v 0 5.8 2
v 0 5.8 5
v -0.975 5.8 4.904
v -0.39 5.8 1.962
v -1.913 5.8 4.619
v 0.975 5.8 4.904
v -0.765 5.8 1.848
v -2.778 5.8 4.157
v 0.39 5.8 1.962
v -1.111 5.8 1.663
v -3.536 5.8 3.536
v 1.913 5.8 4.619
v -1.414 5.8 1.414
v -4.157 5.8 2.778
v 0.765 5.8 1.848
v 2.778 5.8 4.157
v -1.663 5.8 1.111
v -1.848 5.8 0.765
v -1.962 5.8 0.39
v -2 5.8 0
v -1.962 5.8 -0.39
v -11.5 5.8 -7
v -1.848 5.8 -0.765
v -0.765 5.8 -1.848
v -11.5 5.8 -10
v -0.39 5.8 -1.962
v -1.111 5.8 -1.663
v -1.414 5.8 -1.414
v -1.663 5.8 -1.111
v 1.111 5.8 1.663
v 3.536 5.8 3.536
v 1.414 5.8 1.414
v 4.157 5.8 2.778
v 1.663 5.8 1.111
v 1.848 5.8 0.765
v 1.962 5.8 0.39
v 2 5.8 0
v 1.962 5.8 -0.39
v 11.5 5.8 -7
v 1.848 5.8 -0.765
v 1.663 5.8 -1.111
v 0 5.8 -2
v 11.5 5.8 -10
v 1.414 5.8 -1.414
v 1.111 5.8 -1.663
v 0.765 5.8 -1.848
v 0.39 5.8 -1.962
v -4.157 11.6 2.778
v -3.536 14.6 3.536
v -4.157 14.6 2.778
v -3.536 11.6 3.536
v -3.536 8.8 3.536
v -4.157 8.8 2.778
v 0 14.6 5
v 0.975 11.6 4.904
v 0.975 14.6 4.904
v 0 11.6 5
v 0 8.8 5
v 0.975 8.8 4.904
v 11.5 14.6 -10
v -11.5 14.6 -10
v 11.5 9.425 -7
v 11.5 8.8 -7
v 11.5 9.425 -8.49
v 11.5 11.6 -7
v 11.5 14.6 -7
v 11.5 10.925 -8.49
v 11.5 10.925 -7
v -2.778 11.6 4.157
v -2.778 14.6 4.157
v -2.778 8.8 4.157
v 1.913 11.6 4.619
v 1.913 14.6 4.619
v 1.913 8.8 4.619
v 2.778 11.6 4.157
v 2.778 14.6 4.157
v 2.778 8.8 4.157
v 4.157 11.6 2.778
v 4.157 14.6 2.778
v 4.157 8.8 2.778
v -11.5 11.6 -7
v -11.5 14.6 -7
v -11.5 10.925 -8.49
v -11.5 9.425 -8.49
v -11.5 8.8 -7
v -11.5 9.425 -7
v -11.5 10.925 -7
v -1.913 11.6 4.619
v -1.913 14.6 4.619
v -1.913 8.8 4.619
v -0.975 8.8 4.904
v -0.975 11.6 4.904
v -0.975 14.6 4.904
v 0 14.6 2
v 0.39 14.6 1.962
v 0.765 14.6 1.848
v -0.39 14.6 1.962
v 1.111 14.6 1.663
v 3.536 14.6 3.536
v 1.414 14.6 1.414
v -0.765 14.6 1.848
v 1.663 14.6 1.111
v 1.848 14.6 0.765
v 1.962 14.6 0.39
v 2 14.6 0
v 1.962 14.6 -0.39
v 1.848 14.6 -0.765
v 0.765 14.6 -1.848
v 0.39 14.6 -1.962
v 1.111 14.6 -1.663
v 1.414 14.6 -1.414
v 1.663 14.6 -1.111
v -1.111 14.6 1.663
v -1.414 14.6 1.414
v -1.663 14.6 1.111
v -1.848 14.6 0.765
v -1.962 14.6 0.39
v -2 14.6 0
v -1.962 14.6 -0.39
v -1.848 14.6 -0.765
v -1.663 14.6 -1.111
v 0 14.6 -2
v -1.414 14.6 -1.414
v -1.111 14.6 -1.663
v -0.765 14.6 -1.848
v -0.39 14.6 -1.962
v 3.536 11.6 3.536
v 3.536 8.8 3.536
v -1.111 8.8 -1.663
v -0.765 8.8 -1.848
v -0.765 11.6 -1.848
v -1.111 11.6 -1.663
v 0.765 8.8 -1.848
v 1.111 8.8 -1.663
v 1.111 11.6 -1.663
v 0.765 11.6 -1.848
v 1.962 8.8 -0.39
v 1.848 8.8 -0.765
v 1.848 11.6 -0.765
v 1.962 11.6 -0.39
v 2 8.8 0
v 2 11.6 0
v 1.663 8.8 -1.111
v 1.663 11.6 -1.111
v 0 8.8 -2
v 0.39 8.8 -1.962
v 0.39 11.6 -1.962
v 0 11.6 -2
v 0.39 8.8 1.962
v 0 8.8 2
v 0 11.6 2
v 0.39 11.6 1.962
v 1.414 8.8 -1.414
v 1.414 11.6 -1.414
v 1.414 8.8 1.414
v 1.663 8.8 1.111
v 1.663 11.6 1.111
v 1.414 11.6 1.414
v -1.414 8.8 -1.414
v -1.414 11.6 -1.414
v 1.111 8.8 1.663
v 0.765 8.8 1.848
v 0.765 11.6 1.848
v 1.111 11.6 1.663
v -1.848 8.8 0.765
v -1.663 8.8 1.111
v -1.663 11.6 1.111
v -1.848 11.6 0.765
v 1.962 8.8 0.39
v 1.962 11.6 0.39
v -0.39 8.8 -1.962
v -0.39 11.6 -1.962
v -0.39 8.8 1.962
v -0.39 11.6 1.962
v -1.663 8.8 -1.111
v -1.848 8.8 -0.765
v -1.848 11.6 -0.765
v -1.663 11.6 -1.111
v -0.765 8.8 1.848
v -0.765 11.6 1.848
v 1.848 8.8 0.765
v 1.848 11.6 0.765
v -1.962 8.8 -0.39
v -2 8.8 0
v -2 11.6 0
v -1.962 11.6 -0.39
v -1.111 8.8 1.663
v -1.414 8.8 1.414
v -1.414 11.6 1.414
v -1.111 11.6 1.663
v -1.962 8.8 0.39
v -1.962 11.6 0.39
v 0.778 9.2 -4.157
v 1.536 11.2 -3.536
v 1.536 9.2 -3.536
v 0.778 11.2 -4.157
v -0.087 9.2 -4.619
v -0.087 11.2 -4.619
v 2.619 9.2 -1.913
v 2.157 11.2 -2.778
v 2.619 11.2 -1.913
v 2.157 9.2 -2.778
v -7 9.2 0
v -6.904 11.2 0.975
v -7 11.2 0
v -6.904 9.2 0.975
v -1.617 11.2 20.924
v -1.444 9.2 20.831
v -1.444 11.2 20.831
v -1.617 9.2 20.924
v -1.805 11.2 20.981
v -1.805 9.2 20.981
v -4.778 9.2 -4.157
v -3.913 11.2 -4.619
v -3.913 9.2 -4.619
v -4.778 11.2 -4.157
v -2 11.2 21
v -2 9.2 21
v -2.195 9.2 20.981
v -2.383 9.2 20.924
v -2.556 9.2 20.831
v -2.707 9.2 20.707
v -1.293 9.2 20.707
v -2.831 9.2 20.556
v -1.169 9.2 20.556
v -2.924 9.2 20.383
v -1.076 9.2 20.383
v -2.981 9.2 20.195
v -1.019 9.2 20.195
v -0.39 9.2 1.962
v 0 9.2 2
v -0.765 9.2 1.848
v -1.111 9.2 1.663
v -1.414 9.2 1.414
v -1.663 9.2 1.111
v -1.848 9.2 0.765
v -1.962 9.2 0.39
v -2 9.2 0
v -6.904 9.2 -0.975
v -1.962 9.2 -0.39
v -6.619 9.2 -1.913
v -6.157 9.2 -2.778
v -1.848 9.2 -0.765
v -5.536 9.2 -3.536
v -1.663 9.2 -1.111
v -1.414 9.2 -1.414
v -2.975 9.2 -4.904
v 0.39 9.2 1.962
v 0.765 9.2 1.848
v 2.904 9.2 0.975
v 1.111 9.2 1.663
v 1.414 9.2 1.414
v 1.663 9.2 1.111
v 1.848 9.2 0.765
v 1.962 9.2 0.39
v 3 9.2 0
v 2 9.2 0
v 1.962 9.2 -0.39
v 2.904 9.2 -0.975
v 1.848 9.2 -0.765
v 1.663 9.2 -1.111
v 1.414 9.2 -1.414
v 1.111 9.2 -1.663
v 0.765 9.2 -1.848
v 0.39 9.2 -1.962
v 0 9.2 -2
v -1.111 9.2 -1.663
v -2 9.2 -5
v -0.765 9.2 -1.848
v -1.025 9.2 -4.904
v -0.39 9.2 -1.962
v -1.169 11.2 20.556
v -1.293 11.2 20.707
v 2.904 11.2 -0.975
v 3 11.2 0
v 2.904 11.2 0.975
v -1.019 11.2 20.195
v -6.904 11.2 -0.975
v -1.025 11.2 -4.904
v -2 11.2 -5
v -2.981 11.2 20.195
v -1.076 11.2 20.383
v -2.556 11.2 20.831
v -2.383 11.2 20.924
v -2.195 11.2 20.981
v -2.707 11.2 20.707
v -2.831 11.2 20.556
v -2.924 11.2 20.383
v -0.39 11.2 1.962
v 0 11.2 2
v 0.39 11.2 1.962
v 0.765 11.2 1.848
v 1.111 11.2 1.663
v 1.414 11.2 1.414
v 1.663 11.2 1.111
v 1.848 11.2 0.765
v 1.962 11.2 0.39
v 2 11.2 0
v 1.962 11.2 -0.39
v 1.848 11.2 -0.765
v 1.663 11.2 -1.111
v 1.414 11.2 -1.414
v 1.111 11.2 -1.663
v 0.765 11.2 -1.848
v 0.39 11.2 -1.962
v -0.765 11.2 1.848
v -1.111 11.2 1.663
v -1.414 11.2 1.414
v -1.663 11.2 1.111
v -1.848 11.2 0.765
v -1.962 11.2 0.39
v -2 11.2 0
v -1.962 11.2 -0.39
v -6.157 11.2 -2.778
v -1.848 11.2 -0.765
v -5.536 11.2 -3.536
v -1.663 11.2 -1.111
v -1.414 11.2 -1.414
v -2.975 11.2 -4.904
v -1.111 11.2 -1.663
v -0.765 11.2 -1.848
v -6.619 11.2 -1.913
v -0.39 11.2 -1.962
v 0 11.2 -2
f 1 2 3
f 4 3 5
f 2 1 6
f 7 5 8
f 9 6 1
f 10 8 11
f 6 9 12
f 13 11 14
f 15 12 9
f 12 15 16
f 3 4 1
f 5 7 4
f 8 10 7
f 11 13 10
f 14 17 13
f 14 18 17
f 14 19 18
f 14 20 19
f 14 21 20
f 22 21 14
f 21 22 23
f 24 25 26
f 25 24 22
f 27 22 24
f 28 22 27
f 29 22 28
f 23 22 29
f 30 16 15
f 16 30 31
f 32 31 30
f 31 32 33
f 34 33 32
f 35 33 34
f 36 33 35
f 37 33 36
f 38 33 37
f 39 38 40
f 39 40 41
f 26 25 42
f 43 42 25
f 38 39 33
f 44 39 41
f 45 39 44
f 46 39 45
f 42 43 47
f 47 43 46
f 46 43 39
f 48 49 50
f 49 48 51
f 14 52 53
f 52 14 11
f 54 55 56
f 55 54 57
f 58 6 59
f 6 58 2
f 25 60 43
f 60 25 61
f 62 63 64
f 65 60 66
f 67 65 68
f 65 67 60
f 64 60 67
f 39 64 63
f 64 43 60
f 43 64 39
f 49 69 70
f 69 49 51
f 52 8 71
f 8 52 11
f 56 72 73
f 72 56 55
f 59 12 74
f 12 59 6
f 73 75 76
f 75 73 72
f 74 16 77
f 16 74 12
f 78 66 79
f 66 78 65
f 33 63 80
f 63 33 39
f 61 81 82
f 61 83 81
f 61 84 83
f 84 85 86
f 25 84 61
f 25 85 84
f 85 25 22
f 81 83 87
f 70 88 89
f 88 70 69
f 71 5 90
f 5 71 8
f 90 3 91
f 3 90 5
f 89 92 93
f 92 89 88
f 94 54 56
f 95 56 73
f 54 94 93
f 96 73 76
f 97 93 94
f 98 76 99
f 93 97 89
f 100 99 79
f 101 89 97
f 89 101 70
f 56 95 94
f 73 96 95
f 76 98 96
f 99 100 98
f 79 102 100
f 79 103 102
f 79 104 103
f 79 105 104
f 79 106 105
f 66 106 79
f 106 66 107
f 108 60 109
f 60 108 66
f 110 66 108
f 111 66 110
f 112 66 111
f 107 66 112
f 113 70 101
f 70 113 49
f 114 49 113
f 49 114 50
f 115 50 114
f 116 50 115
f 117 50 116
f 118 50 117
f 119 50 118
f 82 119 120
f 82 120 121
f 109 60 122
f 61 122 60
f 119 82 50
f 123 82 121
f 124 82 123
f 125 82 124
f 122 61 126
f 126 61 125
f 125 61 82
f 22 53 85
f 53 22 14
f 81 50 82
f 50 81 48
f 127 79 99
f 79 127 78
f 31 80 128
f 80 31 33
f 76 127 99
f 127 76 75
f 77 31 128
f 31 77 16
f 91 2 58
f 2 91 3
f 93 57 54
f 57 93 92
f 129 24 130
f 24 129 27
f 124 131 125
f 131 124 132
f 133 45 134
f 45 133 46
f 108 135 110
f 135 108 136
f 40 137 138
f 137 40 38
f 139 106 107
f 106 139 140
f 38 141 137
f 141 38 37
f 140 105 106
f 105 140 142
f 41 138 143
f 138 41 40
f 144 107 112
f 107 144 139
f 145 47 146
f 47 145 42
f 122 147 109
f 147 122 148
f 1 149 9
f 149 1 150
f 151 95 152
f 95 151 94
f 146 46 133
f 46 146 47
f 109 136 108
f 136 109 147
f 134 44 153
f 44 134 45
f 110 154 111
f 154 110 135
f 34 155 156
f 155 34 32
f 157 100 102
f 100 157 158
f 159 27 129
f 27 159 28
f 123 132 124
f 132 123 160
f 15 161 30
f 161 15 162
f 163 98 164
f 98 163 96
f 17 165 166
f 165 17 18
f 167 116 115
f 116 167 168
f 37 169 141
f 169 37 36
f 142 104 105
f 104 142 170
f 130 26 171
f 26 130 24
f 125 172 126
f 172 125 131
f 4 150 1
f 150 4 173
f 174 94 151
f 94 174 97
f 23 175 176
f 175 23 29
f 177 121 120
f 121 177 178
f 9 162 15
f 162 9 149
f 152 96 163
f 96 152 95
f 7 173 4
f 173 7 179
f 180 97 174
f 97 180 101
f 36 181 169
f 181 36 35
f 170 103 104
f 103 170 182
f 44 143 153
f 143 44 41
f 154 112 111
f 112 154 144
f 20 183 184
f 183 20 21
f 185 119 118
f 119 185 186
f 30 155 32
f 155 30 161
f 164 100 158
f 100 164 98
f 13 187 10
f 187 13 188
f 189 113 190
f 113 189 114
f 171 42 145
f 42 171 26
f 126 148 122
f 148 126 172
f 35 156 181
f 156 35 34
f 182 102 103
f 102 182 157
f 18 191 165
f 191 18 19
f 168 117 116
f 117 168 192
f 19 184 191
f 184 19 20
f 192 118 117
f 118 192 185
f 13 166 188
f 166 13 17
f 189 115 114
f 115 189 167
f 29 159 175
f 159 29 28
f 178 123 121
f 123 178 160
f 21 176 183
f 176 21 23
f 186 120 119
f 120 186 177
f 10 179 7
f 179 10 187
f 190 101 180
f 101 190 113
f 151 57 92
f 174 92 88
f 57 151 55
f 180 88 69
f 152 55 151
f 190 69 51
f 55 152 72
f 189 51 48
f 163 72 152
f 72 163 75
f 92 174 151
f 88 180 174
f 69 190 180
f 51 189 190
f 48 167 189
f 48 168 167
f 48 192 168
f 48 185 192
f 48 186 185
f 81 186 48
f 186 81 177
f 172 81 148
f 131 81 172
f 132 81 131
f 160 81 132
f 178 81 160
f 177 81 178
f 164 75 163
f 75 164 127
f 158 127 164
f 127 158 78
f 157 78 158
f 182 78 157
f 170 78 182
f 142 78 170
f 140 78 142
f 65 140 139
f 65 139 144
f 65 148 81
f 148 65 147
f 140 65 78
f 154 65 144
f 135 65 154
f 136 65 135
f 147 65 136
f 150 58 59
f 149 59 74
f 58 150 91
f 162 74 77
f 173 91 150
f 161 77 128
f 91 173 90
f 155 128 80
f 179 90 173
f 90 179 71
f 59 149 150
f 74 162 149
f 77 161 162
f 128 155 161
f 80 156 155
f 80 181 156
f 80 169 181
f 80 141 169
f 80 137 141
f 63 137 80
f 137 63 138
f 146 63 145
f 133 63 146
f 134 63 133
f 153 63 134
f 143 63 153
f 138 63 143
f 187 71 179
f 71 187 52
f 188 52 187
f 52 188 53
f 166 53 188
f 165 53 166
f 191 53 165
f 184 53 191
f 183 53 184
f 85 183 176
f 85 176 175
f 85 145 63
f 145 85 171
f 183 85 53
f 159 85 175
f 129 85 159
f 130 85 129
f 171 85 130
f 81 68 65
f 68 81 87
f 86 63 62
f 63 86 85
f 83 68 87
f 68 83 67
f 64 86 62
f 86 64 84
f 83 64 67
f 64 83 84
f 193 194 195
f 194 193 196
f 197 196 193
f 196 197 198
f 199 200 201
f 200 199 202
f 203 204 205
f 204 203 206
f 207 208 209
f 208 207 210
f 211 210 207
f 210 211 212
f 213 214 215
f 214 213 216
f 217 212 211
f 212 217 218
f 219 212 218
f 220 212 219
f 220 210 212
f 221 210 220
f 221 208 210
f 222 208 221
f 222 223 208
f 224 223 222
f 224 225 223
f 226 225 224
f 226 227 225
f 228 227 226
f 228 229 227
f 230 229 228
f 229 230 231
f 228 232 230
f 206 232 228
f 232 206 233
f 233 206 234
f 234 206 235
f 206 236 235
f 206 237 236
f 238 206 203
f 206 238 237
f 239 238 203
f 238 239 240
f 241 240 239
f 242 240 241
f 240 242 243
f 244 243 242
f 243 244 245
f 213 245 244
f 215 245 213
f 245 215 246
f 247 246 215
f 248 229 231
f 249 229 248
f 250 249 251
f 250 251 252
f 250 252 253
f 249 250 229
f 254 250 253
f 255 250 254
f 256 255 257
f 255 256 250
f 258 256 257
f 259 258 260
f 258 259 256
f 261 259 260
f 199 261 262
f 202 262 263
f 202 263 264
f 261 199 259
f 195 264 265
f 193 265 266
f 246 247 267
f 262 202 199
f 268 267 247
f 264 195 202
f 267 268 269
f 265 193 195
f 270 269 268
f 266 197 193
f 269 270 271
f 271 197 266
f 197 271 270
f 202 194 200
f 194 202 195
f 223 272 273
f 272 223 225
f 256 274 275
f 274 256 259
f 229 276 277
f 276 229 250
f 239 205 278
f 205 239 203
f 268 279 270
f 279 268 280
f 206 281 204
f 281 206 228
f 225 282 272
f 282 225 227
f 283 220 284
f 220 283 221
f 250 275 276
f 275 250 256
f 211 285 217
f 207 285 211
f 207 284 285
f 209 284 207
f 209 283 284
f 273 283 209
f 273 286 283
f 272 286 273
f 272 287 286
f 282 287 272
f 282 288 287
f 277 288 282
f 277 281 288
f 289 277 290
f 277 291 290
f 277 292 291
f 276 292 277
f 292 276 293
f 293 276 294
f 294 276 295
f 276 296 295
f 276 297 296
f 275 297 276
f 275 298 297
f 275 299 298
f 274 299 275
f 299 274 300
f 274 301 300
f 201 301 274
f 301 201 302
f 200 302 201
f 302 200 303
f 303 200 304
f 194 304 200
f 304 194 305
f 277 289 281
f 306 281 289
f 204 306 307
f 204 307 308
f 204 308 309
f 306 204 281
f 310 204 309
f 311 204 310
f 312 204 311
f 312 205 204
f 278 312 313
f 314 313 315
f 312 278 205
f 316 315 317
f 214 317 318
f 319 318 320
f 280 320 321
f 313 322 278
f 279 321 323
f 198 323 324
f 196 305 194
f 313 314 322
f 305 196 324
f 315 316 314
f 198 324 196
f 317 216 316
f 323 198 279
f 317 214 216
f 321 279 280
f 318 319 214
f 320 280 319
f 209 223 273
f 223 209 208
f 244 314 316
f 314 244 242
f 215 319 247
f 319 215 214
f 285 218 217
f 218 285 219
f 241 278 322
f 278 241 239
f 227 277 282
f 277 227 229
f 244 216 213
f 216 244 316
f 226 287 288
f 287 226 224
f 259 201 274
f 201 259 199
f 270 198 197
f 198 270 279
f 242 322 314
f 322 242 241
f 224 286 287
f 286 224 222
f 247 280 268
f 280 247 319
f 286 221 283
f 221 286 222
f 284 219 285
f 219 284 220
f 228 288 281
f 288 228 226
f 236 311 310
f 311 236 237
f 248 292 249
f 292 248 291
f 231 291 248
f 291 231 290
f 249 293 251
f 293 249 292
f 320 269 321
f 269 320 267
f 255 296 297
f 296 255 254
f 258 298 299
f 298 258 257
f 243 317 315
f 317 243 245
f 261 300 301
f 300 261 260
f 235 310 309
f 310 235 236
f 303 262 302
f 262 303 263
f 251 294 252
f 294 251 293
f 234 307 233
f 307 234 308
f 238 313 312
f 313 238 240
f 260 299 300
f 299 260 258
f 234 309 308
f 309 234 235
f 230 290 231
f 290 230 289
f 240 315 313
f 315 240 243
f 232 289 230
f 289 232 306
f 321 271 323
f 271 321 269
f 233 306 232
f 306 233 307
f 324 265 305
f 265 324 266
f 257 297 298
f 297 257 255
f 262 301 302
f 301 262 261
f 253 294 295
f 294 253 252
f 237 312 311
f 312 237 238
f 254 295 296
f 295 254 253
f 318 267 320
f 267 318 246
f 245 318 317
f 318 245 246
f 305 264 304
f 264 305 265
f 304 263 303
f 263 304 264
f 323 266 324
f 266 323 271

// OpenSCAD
// [FL_INDEX: keywords="openscad, 3d_parametric, Customizable_Cable_Lockdown_V2, csg_solid" | COT="Parametric OpenSCAD design from 3DCodeverse"]
// Title: Customizable Cable Lockdown V2

// Rotating cable lock

// Radius of large end of latch
outerR = 5;
// How far off-center the pivot point is
offset = 2;
// Length of latch
len = 20;
// Radius of pivot hole
hubR = 2;
// Width of latch
width = 2;
// Thickness of side and bottom walls
thick = 3;
// Clearance between base and latch
gap=0.4;
// Tightness (positive makes latch press harder against base)
tight = 0;
// Line Radius
lR = .75;
// Number of Latches
numLatches = 1;
// Angle of latch
angle = 90; //[0:180]
// Which part to print
part=0; //[0:Assembled, 1:Base, 2:Latch]

/* [Hidden] */
$fn=32;
spacing = width+gap+thick+gap;

if (part==0) rotate([-90,0,0]) assembled();
if (part==1) rotate([-90,0,0]) bases();
if (part==2) latch();

module bases() {
	for (l = [1:numLatches]) {
		translate([0,0,l*spacing]) base();
		}
	}

//module body() {
//	h = outerR+thick+hubR+thick;
//	difference() {
//		hull() {
//			translate([-1,len,outerR+thick]) rotate([0,90,0]) 
//				cylinder(r=hubR+thick, h=width+2*thick+2);	
//			}
//		cube([width+2*thick,2*len,h]);
//		translate([thick-gap,-1,thick]) cube([width+2*gap,2*len+2,h]);
//		pin();
//		}
//	}

module latches(angle) {
	for (l = [1:numLatches]) {
		translate([0,0,l*spacing]) latch(angle);
		}
	}

module latch(angle) {
	rotate([0,0,angle]) difference() {
		hull() {
			cylinder(r=outerR, h=width);
			translate([len,0,0]) cylinder(r=1, h=width);
			}
		translate([0,offset,-1]) cylinder(r=hubR,h=width+2);
		}
	}

module pin() {
	translate([-1,len,outerR+thick])
	rotate([0,90,0])
	cylinder(r=hubR, h=width+2*thick+2);
	}

module assembled() {
	color("blue") bases();
	color("yellow") rotate([0,0,-angle]) translate([0,-offset,thick+gap]) latches(0);
	}

module base() {
	h=outerR+offset;
	tall=width+2*(thick+gap);
	
	difference() {
		hull() {
			cylinder(r=hubR+thick,h=tall);
			translate([-len/2-thick/2,h,0]) cube([thick,thick,tall]);
			translate([len/2-thick/2,h,0]) cube([thick,thick,tall]);
			}
		translate([0,0,-1]) cylinder(r=hubR,h=width+2*thick+2*gap+2);
		translate([-len-1,-10-tight,thick]) cube([2*len+4,h+10,width+2*gap]);
		translate([-len-1,h-tight-.01,thick+width/2-lR/2]) cube([2*len+4,2*lR,2*lR]);
		//#translate([0,0,thick+gap+width/2]) cylinder(r=h+2*lR, h=lR);
		}
	}
